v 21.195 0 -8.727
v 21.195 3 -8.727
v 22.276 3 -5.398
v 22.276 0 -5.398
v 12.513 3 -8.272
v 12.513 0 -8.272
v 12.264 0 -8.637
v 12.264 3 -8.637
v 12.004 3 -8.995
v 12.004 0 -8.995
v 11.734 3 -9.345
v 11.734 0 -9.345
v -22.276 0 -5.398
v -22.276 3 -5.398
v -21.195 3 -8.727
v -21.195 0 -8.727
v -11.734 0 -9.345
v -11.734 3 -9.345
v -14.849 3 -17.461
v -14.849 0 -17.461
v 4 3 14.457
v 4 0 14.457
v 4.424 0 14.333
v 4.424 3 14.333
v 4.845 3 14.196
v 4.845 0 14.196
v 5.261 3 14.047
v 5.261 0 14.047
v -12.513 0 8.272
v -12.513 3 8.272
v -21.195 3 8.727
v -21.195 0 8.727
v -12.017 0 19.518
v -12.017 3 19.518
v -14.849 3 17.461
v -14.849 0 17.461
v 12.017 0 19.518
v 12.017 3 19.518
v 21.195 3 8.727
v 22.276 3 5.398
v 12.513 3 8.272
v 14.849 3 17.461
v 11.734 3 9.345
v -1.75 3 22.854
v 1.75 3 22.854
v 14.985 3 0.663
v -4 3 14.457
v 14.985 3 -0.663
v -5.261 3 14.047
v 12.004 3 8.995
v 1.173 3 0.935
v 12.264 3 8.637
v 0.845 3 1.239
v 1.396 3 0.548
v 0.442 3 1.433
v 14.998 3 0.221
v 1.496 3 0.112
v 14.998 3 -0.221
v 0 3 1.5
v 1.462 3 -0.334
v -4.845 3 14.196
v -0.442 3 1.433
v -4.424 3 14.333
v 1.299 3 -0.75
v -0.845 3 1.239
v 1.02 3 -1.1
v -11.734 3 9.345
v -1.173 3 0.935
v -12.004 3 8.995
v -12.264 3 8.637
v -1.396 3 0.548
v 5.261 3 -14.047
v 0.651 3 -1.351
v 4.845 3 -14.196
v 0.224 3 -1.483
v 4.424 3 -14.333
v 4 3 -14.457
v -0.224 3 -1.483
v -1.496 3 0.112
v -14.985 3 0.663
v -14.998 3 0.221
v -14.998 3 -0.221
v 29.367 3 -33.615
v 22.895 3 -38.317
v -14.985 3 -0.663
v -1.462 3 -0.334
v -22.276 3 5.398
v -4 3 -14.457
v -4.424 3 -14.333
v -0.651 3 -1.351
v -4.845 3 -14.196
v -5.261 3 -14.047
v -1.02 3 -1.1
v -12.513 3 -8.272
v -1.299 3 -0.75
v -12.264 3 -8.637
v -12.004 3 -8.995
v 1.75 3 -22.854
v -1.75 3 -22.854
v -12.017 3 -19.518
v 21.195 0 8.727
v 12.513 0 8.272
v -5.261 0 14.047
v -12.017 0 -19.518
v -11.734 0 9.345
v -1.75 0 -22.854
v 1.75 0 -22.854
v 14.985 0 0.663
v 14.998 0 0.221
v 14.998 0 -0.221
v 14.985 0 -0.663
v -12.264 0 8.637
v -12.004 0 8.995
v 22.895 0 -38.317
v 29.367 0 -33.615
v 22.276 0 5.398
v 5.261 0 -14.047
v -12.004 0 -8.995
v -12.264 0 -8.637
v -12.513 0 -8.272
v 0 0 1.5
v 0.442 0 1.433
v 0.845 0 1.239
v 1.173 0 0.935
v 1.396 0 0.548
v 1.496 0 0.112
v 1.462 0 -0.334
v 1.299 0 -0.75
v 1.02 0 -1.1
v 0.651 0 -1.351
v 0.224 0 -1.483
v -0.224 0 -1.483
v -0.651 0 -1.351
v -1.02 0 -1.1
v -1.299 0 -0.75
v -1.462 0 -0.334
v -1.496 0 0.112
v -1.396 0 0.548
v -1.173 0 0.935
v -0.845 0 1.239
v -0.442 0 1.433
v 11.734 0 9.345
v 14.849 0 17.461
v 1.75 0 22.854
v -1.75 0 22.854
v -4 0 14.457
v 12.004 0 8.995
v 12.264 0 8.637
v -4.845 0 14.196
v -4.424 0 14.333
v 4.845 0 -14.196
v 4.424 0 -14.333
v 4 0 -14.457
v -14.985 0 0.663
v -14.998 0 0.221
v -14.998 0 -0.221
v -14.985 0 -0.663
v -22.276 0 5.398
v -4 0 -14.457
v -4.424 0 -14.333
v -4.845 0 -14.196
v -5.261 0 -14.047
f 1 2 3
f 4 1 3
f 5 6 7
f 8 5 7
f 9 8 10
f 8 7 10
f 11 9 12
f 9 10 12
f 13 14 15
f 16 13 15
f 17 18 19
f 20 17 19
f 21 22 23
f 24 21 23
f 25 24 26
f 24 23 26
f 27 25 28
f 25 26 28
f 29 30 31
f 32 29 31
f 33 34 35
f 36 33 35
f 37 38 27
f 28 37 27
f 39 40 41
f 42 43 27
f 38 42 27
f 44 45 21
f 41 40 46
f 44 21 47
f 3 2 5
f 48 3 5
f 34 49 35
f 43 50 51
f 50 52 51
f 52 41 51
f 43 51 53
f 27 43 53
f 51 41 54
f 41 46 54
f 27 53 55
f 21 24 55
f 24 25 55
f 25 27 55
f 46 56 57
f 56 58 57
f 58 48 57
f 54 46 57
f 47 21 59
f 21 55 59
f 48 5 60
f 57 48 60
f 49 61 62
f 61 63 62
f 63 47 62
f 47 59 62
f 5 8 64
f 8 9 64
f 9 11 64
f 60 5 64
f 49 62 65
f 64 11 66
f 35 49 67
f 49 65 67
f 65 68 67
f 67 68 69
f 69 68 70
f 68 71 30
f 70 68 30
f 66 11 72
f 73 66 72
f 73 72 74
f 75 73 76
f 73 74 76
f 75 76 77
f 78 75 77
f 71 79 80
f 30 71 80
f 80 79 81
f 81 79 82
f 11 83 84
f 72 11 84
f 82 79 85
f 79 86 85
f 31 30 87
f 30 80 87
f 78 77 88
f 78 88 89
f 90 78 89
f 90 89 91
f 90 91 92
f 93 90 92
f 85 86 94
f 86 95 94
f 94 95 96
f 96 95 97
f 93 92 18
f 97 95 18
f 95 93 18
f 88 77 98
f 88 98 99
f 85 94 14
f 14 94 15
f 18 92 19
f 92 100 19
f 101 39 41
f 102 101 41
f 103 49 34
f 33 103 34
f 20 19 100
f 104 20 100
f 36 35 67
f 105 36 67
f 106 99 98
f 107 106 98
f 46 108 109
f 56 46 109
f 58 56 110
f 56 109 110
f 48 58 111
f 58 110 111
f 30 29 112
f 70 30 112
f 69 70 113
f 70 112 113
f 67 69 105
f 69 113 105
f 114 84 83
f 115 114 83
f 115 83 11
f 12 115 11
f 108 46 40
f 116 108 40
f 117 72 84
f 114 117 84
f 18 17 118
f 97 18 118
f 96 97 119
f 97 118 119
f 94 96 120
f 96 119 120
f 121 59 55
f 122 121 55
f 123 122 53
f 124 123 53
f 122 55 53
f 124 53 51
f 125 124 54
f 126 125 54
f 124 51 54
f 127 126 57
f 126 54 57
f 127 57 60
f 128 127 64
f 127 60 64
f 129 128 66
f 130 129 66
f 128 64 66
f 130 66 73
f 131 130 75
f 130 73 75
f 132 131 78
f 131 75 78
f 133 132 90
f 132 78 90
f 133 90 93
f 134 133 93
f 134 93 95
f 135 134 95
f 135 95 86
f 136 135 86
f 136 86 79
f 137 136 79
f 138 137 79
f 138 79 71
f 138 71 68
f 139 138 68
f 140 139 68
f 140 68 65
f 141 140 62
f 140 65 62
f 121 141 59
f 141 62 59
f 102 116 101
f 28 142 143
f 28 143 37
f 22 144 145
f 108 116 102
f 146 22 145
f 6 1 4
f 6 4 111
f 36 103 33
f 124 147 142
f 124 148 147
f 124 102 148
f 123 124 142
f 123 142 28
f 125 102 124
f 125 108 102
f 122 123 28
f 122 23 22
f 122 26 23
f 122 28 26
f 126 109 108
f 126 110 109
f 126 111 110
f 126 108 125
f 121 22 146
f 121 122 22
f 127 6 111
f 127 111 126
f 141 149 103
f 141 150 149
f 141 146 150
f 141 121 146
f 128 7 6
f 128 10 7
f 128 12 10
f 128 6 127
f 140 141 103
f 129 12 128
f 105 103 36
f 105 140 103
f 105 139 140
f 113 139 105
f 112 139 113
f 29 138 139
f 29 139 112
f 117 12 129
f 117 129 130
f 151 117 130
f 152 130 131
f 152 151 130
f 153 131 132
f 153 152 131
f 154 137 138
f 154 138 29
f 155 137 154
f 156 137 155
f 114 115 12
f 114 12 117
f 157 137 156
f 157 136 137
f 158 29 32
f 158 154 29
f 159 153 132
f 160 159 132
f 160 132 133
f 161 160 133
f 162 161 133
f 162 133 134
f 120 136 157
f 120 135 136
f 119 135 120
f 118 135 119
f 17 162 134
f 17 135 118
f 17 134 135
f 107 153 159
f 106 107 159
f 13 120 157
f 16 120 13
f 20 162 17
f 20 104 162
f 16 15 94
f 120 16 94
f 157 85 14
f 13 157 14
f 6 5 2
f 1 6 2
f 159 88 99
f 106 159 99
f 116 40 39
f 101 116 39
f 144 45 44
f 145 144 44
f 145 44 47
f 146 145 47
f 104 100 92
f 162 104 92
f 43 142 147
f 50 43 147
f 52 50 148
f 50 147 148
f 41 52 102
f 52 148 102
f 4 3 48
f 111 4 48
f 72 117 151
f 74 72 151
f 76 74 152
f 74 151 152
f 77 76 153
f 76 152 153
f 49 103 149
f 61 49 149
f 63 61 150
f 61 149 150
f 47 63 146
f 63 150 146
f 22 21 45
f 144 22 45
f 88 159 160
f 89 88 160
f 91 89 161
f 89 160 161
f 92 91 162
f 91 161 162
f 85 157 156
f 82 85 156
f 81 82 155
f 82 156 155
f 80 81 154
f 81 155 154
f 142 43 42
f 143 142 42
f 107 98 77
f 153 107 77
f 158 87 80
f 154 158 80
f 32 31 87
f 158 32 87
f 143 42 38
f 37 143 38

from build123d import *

# Parameters (mm, degrees)
SKETCH1_R           = 15
BOSS_EXTRUDE1_DEPTH = 3
BOSS_EXTRUDE4_DEPTH = 3
BOSS_EXTRUDE5_DEPTH = 3
SKETCH4_R           = 1.5
CUT_EXTRUDE1_DEPTH  = 3


with BuildPart() as part:
    # Sketch1 → Boss-Extrude1 (new body)
    with BuildSketch(Plane(origin=(0, 0, 0), x_dir=(1, 0, 0), z_dir=(0, 1, 0))):
        with Locations(Location((0, 0, 0), (0, 0, 270))):
            Circle(SKETCH1_R)
    extrude(amount=BOSS_EXTRUDE1_DEPTH)

    # Sketch2 → Boss-Extrude4 (add)
    with BuildSketch(Plane(origin=(0, 3, 0), x_dir=(1, 0, 0), z_dir=(0, 1, 0))):
        Polygon((1.75, -22.853946612), (-1.75, -22.853946612), (-4, -14.456832295), (4, -14.456832295), align=None)
        Polygon((-14.848992515, -17.460607006), (-11.733580795, -9.344682002), (-5.26144484, -14.04696402), (-12.017433035, -19.517855389), align=None)
        Polygon((-22.276174588, -5.397908988), (-14.985332536, -0.663180799), (-12.513196581, -8.271632929), (-21.194615108, -8.726606795), align=None)
        Polygon((-21.194615108, 8.726606795), (-12.513196581, 8.271632929), (-14.985332536, 0.663180799), (-22.276174588, 5.397908988), align=None)
        Polygon((-12.017433035, 19.517855389), (-5.26144484, 14.04696402), (-11.733580795, 9.344682002), (-14.848992515, 17.460607006), align=None)
        Polygon((1.75, 22.853946612), (4, 14.456832295), (-4, 14.456832295), (-1.75, 22.853946612), align=None)
        Polygon((14.848992515, 17.460607006), (11.733580795, 9.344682002), (5.26144484, 14.04696402), (12.017433035, 19.517855389), align=None)
        Polygon((22.276174588, 5.397908988), (14.985332536, 0.663180799), (12.513196581, 8.271632929), (21.194615108, 8.726606795), align=None)
        Polygon((21.194615108, -8.726606795), (12.513196581, -8.271632929), (14.985332536, -0.663180799), (22.276174588, -5.397908988), align=None)
        Polygon((12.017433035, -19.517855389), (5.26144484, -14.04696402), (11.733580795, -9.344682002), (14.848992515, -17.460607006), align=None)
    extrude(amount=-BOSS_EXTRUDE4_DEPTH)

    # Sketch3 → Boss-Extrude5 (add)
    with BuildSketch(Plane(origin=(0, 3, 0), x_dir=(1, 0, 0), z_dir=(0, 1, 0))):
        Polygon((0, 0), (5.26144484, 14.04696402), (22.895002409, 38.317473852), (29.367138364, 33.615191833), (11.733580795, 9.344682002), align=None)
    extrude(amount=-BOSS_EXTRUDE5_DEPTH)

    # Sketch4 → Cut-Extrude1 (cut)
    with BuildSketch(Plane(origin=(0, 3, 0), x_dir=(1, 0, 0), z_dir=(0, 1, 0))):
        with Locations(Location((0, 0, 0), (0, 0, 270))):
            Circle(SKETCH4_R)
    extrude(amount=-CUT_EXTRUDE1_DEPTH, mode=Mode.SUBTRACT)


solid = part.part
